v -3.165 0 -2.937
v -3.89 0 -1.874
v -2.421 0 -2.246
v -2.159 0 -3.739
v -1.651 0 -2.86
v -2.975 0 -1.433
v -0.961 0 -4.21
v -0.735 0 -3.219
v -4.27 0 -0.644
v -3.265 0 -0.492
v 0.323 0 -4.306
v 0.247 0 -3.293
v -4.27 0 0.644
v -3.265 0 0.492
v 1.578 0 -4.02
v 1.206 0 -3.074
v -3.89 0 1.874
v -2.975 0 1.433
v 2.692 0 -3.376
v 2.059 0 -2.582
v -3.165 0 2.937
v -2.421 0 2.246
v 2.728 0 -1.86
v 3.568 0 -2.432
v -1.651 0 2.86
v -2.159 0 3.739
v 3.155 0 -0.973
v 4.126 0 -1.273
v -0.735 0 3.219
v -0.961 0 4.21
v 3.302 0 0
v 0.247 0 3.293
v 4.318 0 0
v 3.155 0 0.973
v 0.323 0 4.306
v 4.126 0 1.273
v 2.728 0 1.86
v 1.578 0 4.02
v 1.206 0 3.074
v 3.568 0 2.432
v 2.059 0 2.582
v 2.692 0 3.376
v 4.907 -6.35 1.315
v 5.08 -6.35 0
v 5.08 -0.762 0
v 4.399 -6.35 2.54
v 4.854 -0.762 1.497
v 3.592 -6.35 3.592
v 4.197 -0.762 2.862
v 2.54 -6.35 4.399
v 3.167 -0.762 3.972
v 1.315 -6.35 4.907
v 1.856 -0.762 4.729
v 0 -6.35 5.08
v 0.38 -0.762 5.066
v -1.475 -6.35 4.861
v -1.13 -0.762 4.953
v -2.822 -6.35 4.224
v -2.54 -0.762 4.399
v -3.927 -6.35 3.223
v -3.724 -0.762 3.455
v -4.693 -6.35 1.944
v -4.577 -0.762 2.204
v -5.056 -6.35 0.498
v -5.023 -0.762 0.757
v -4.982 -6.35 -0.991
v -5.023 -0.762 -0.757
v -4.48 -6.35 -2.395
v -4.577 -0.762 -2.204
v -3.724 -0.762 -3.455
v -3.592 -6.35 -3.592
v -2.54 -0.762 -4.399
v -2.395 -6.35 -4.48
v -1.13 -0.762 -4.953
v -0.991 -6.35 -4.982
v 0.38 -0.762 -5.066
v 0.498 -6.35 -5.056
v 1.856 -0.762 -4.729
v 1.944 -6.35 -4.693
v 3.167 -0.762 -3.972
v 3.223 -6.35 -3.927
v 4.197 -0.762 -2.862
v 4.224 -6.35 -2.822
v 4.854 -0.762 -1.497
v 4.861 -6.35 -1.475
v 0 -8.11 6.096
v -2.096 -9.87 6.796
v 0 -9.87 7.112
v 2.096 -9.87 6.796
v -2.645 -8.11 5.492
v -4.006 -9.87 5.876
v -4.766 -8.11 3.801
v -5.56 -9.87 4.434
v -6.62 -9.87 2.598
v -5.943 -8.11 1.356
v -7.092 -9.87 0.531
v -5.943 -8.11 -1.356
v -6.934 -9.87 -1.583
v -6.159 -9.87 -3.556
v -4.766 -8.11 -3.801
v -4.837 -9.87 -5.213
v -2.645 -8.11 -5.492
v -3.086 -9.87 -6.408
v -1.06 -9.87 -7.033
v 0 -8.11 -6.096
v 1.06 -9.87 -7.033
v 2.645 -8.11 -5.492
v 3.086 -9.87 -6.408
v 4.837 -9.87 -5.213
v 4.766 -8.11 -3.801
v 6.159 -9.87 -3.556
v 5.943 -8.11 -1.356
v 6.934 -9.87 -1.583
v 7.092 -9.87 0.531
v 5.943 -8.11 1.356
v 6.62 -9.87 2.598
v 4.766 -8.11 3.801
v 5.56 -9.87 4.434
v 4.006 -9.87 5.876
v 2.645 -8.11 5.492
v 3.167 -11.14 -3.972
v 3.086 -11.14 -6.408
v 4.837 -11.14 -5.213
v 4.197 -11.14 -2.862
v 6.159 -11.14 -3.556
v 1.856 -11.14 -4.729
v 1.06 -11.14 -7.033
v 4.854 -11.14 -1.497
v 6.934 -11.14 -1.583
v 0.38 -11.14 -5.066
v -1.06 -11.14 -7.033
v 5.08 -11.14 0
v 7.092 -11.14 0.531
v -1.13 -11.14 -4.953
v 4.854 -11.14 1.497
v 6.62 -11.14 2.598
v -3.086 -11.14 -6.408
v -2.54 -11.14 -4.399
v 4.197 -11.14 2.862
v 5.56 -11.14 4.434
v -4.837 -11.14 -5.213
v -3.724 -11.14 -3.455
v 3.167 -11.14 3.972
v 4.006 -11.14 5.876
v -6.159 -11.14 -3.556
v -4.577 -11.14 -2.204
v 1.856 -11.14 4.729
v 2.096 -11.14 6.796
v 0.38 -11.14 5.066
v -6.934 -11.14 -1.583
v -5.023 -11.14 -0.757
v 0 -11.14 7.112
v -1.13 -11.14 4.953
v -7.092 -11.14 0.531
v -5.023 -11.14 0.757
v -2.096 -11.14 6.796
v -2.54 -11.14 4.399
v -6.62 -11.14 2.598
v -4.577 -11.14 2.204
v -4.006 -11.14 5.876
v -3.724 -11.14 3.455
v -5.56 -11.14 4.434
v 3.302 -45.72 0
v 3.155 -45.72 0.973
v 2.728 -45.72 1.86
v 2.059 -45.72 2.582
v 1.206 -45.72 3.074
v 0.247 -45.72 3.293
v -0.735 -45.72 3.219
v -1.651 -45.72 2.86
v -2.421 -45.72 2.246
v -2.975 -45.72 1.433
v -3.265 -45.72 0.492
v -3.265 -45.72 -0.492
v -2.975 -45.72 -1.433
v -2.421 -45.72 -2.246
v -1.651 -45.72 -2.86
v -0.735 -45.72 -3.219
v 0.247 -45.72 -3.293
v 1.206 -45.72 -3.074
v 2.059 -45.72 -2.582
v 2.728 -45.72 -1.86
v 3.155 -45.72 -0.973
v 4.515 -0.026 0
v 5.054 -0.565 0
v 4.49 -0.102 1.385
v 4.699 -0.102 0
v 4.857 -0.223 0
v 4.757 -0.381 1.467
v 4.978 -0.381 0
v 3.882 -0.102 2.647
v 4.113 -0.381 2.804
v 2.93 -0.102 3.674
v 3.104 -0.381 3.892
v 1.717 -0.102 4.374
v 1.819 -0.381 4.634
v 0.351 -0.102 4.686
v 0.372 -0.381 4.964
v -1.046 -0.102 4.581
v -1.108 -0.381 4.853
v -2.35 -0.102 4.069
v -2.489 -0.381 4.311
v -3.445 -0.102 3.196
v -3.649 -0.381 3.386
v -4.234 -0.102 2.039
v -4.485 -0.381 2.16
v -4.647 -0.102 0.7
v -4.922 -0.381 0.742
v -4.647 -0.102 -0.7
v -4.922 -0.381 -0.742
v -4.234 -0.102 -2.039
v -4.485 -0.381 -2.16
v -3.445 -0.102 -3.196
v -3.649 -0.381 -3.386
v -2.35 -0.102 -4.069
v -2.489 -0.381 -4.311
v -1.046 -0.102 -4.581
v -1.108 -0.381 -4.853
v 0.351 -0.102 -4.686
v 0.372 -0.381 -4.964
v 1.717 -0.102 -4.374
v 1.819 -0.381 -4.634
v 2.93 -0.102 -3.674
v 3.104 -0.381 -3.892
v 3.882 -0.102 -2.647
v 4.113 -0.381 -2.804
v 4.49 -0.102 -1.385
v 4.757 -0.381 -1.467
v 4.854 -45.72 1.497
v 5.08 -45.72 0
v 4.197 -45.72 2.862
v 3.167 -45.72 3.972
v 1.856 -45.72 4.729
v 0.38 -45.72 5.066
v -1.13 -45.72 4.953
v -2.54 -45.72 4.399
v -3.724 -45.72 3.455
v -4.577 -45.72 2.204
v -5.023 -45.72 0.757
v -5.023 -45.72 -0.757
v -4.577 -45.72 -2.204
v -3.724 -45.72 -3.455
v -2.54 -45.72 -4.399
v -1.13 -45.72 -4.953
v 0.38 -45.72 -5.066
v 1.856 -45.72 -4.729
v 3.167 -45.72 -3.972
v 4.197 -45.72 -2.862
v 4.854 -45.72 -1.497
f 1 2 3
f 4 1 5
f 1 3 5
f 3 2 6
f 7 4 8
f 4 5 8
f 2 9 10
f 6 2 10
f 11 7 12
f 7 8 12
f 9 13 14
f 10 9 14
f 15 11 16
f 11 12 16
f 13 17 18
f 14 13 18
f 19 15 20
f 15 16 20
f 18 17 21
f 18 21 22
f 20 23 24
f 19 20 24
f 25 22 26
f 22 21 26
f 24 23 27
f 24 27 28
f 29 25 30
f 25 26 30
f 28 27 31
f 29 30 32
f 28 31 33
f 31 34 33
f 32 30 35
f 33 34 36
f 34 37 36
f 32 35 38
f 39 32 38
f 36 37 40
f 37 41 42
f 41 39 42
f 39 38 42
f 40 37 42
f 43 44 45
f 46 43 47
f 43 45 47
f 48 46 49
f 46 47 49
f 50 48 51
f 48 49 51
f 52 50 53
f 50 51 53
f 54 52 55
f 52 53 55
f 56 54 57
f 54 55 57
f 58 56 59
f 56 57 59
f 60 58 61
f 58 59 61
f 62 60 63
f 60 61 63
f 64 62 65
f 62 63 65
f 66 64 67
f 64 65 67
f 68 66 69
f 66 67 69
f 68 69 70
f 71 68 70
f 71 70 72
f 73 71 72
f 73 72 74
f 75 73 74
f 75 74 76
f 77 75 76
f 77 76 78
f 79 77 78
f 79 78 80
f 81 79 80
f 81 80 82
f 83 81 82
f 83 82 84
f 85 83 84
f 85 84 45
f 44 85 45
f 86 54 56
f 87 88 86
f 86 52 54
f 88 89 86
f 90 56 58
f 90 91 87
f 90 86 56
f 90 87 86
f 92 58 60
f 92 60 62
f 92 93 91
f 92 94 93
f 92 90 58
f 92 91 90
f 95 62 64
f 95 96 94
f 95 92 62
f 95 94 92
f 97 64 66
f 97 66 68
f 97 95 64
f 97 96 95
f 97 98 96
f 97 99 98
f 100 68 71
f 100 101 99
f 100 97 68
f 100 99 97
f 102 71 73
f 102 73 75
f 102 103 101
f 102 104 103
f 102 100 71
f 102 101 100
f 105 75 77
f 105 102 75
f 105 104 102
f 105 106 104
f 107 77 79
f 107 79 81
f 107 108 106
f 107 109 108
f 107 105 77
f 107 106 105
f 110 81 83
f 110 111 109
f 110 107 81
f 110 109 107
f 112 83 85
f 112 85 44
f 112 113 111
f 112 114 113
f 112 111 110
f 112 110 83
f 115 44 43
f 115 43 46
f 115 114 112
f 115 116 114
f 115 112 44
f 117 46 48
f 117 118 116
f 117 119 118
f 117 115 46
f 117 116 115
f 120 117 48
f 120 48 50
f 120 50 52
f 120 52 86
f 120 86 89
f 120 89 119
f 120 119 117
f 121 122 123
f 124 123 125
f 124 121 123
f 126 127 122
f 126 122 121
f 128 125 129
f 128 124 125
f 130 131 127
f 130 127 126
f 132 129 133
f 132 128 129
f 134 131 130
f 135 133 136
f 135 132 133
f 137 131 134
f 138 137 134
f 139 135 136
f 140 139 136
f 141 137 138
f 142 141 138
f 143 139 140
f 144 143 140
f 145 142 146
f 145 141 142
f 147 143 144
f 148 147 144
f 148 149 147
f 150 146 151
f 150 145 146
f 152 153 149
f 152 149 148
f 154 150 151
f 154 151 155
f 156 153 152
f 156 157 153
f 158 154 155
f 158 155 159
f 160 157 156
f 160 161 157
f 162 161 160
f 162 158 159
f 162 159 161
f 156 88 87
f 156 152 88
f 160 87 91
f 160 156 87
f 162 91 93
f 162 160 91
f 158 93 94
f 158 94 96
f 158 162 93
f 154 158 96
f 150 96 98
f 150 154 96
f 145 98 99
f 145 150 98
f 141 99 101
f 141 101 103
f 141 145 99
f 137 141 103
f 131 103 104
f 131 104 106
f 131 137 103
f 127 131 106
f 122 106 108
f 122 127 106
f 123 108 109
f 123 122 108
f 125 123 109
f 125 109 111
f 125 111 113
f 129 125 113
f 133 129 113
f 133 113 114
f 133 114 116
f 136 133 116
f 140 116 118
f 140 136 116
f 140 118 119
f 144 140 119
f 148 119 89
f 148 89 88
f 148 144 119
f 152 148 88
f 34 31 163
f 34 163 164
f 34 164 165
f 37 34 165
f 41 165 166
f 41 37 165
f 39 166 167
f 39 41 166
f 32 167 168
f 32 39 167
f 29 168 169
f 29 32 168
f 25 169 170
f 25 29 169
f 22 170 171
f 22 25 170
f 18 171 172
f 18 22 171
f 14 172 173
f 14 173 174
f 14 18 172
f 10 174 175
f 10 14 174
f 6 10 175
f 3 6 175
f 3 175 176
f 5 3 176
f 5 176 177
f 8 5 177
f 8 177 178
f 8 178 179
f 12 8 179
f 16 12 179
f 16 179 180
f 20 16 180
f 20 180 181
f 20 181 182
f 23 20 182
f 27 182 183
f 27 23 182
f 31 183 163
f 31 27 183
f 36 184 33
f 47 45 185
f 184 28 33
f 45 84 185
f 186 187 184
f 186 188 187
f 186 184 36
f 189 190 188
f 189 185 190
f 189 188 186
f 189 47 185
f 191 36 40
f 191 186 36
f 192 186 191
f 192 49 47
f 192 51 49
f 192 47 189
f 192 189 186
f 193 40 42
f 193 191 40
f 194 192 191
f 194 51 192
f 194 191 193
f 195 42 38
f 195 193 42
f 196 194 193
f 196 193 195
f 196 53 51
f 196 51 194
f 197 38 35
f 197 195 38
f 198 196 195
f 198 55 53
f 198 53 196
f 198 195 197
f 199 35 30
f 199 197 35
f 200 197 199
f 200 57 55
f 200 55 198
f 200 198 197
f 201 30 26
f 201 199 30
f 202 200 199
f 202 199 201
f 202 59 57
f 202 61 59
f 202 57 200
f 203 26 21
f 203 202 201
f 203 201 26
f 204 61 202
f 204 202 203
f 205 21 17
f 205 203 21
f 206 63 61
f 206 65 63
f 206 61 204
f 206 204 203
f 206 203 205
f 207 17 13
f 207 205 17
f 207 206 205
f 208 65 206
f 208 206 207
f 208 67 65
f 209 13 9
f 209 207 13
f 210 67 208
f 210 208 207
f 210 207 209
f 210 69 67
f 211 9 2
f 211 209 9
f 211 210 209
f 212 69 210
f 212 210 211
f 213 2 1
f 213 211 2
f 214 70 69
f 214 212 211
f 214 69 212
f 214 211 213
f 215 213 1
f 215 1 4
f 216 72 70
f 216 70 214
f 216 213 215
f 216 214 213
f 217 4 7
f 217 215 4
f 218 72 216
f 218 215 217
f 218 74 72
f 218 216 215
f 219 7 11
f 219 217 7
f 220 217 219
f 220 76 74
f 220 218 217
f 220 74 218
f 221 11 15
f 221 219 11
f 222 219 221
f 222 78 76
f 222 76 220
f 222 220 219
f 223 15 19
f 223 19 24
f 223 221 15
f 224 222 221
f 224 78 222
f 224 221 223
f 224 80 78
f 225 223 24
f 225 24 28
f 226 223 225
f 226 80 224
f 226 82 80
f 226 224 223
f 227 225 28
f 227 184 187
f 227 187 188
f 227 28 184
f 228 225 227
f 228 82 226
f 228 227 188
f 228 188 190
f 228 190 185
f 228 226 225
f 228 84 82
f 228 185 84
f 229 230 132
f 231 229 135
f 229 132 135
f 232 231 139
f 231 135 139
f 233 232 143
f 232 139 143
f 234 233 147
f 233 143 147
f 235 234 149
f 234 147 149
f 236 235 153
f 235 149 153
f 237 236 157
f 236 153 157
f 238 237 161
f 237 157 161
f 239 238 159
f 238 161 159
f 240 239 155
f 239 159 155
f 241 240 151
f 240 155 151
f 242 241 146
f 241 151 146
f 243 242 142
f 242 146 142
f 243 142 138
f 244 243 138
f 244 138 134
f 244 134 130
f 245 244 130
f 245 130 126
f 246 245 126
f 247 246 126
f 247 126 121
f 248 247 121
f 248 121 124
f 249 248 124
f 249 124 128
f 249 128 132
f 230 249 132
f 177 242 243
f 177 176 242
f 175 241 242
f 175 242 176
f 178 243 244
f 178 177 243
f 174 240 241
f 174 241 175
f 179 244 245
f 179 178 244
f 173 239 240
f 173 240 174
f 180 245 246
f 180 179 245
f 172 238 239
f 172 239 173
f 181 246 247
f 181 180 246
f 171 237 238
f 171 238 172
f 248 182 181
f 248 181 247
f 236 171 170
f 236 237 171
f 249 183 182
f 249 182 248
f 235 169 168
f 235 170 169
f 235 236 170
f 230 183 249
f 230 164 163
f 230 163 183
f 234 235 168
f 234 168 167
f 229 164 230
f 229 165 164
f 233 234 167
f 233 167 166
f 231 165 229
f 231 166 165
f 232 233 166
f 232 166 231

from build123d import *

# Parameters (mm, degrees)
F0_R     = 5.08
F0_R_2   = 3.302
F1_DEPTH = 45.72
F4_R     = 0.762


with BuildPart() as f1:
    # F0 (on Front) → F1 (new body)
    with BuildSketch(Plane.XZ):
        Circle(F0_R)
        Circle(F0_R_2, mode=Mode.SUBTRACT)
    extrude(amount=F1_DEPTH)

    # F2 (on Right) → F3 (revolve)
    with BuildSketch(Plane.YZ):
        Polygon((-11.139527, 7.112), (-11.139527, 5.08), (-6.35, 5.08), (-9.869527, 7.112), align=None)
    revolve(axis=Axis((0, -45.72, 0), (0, -1, 0)))

    # F4
    f4_edges = [f1.edges().sort_by_distance(p)[0] for p in [
        (-5.08, 0, 0),
    ]]
    fillet(f4_edges, radius=F4_R)


solid = f1.part
